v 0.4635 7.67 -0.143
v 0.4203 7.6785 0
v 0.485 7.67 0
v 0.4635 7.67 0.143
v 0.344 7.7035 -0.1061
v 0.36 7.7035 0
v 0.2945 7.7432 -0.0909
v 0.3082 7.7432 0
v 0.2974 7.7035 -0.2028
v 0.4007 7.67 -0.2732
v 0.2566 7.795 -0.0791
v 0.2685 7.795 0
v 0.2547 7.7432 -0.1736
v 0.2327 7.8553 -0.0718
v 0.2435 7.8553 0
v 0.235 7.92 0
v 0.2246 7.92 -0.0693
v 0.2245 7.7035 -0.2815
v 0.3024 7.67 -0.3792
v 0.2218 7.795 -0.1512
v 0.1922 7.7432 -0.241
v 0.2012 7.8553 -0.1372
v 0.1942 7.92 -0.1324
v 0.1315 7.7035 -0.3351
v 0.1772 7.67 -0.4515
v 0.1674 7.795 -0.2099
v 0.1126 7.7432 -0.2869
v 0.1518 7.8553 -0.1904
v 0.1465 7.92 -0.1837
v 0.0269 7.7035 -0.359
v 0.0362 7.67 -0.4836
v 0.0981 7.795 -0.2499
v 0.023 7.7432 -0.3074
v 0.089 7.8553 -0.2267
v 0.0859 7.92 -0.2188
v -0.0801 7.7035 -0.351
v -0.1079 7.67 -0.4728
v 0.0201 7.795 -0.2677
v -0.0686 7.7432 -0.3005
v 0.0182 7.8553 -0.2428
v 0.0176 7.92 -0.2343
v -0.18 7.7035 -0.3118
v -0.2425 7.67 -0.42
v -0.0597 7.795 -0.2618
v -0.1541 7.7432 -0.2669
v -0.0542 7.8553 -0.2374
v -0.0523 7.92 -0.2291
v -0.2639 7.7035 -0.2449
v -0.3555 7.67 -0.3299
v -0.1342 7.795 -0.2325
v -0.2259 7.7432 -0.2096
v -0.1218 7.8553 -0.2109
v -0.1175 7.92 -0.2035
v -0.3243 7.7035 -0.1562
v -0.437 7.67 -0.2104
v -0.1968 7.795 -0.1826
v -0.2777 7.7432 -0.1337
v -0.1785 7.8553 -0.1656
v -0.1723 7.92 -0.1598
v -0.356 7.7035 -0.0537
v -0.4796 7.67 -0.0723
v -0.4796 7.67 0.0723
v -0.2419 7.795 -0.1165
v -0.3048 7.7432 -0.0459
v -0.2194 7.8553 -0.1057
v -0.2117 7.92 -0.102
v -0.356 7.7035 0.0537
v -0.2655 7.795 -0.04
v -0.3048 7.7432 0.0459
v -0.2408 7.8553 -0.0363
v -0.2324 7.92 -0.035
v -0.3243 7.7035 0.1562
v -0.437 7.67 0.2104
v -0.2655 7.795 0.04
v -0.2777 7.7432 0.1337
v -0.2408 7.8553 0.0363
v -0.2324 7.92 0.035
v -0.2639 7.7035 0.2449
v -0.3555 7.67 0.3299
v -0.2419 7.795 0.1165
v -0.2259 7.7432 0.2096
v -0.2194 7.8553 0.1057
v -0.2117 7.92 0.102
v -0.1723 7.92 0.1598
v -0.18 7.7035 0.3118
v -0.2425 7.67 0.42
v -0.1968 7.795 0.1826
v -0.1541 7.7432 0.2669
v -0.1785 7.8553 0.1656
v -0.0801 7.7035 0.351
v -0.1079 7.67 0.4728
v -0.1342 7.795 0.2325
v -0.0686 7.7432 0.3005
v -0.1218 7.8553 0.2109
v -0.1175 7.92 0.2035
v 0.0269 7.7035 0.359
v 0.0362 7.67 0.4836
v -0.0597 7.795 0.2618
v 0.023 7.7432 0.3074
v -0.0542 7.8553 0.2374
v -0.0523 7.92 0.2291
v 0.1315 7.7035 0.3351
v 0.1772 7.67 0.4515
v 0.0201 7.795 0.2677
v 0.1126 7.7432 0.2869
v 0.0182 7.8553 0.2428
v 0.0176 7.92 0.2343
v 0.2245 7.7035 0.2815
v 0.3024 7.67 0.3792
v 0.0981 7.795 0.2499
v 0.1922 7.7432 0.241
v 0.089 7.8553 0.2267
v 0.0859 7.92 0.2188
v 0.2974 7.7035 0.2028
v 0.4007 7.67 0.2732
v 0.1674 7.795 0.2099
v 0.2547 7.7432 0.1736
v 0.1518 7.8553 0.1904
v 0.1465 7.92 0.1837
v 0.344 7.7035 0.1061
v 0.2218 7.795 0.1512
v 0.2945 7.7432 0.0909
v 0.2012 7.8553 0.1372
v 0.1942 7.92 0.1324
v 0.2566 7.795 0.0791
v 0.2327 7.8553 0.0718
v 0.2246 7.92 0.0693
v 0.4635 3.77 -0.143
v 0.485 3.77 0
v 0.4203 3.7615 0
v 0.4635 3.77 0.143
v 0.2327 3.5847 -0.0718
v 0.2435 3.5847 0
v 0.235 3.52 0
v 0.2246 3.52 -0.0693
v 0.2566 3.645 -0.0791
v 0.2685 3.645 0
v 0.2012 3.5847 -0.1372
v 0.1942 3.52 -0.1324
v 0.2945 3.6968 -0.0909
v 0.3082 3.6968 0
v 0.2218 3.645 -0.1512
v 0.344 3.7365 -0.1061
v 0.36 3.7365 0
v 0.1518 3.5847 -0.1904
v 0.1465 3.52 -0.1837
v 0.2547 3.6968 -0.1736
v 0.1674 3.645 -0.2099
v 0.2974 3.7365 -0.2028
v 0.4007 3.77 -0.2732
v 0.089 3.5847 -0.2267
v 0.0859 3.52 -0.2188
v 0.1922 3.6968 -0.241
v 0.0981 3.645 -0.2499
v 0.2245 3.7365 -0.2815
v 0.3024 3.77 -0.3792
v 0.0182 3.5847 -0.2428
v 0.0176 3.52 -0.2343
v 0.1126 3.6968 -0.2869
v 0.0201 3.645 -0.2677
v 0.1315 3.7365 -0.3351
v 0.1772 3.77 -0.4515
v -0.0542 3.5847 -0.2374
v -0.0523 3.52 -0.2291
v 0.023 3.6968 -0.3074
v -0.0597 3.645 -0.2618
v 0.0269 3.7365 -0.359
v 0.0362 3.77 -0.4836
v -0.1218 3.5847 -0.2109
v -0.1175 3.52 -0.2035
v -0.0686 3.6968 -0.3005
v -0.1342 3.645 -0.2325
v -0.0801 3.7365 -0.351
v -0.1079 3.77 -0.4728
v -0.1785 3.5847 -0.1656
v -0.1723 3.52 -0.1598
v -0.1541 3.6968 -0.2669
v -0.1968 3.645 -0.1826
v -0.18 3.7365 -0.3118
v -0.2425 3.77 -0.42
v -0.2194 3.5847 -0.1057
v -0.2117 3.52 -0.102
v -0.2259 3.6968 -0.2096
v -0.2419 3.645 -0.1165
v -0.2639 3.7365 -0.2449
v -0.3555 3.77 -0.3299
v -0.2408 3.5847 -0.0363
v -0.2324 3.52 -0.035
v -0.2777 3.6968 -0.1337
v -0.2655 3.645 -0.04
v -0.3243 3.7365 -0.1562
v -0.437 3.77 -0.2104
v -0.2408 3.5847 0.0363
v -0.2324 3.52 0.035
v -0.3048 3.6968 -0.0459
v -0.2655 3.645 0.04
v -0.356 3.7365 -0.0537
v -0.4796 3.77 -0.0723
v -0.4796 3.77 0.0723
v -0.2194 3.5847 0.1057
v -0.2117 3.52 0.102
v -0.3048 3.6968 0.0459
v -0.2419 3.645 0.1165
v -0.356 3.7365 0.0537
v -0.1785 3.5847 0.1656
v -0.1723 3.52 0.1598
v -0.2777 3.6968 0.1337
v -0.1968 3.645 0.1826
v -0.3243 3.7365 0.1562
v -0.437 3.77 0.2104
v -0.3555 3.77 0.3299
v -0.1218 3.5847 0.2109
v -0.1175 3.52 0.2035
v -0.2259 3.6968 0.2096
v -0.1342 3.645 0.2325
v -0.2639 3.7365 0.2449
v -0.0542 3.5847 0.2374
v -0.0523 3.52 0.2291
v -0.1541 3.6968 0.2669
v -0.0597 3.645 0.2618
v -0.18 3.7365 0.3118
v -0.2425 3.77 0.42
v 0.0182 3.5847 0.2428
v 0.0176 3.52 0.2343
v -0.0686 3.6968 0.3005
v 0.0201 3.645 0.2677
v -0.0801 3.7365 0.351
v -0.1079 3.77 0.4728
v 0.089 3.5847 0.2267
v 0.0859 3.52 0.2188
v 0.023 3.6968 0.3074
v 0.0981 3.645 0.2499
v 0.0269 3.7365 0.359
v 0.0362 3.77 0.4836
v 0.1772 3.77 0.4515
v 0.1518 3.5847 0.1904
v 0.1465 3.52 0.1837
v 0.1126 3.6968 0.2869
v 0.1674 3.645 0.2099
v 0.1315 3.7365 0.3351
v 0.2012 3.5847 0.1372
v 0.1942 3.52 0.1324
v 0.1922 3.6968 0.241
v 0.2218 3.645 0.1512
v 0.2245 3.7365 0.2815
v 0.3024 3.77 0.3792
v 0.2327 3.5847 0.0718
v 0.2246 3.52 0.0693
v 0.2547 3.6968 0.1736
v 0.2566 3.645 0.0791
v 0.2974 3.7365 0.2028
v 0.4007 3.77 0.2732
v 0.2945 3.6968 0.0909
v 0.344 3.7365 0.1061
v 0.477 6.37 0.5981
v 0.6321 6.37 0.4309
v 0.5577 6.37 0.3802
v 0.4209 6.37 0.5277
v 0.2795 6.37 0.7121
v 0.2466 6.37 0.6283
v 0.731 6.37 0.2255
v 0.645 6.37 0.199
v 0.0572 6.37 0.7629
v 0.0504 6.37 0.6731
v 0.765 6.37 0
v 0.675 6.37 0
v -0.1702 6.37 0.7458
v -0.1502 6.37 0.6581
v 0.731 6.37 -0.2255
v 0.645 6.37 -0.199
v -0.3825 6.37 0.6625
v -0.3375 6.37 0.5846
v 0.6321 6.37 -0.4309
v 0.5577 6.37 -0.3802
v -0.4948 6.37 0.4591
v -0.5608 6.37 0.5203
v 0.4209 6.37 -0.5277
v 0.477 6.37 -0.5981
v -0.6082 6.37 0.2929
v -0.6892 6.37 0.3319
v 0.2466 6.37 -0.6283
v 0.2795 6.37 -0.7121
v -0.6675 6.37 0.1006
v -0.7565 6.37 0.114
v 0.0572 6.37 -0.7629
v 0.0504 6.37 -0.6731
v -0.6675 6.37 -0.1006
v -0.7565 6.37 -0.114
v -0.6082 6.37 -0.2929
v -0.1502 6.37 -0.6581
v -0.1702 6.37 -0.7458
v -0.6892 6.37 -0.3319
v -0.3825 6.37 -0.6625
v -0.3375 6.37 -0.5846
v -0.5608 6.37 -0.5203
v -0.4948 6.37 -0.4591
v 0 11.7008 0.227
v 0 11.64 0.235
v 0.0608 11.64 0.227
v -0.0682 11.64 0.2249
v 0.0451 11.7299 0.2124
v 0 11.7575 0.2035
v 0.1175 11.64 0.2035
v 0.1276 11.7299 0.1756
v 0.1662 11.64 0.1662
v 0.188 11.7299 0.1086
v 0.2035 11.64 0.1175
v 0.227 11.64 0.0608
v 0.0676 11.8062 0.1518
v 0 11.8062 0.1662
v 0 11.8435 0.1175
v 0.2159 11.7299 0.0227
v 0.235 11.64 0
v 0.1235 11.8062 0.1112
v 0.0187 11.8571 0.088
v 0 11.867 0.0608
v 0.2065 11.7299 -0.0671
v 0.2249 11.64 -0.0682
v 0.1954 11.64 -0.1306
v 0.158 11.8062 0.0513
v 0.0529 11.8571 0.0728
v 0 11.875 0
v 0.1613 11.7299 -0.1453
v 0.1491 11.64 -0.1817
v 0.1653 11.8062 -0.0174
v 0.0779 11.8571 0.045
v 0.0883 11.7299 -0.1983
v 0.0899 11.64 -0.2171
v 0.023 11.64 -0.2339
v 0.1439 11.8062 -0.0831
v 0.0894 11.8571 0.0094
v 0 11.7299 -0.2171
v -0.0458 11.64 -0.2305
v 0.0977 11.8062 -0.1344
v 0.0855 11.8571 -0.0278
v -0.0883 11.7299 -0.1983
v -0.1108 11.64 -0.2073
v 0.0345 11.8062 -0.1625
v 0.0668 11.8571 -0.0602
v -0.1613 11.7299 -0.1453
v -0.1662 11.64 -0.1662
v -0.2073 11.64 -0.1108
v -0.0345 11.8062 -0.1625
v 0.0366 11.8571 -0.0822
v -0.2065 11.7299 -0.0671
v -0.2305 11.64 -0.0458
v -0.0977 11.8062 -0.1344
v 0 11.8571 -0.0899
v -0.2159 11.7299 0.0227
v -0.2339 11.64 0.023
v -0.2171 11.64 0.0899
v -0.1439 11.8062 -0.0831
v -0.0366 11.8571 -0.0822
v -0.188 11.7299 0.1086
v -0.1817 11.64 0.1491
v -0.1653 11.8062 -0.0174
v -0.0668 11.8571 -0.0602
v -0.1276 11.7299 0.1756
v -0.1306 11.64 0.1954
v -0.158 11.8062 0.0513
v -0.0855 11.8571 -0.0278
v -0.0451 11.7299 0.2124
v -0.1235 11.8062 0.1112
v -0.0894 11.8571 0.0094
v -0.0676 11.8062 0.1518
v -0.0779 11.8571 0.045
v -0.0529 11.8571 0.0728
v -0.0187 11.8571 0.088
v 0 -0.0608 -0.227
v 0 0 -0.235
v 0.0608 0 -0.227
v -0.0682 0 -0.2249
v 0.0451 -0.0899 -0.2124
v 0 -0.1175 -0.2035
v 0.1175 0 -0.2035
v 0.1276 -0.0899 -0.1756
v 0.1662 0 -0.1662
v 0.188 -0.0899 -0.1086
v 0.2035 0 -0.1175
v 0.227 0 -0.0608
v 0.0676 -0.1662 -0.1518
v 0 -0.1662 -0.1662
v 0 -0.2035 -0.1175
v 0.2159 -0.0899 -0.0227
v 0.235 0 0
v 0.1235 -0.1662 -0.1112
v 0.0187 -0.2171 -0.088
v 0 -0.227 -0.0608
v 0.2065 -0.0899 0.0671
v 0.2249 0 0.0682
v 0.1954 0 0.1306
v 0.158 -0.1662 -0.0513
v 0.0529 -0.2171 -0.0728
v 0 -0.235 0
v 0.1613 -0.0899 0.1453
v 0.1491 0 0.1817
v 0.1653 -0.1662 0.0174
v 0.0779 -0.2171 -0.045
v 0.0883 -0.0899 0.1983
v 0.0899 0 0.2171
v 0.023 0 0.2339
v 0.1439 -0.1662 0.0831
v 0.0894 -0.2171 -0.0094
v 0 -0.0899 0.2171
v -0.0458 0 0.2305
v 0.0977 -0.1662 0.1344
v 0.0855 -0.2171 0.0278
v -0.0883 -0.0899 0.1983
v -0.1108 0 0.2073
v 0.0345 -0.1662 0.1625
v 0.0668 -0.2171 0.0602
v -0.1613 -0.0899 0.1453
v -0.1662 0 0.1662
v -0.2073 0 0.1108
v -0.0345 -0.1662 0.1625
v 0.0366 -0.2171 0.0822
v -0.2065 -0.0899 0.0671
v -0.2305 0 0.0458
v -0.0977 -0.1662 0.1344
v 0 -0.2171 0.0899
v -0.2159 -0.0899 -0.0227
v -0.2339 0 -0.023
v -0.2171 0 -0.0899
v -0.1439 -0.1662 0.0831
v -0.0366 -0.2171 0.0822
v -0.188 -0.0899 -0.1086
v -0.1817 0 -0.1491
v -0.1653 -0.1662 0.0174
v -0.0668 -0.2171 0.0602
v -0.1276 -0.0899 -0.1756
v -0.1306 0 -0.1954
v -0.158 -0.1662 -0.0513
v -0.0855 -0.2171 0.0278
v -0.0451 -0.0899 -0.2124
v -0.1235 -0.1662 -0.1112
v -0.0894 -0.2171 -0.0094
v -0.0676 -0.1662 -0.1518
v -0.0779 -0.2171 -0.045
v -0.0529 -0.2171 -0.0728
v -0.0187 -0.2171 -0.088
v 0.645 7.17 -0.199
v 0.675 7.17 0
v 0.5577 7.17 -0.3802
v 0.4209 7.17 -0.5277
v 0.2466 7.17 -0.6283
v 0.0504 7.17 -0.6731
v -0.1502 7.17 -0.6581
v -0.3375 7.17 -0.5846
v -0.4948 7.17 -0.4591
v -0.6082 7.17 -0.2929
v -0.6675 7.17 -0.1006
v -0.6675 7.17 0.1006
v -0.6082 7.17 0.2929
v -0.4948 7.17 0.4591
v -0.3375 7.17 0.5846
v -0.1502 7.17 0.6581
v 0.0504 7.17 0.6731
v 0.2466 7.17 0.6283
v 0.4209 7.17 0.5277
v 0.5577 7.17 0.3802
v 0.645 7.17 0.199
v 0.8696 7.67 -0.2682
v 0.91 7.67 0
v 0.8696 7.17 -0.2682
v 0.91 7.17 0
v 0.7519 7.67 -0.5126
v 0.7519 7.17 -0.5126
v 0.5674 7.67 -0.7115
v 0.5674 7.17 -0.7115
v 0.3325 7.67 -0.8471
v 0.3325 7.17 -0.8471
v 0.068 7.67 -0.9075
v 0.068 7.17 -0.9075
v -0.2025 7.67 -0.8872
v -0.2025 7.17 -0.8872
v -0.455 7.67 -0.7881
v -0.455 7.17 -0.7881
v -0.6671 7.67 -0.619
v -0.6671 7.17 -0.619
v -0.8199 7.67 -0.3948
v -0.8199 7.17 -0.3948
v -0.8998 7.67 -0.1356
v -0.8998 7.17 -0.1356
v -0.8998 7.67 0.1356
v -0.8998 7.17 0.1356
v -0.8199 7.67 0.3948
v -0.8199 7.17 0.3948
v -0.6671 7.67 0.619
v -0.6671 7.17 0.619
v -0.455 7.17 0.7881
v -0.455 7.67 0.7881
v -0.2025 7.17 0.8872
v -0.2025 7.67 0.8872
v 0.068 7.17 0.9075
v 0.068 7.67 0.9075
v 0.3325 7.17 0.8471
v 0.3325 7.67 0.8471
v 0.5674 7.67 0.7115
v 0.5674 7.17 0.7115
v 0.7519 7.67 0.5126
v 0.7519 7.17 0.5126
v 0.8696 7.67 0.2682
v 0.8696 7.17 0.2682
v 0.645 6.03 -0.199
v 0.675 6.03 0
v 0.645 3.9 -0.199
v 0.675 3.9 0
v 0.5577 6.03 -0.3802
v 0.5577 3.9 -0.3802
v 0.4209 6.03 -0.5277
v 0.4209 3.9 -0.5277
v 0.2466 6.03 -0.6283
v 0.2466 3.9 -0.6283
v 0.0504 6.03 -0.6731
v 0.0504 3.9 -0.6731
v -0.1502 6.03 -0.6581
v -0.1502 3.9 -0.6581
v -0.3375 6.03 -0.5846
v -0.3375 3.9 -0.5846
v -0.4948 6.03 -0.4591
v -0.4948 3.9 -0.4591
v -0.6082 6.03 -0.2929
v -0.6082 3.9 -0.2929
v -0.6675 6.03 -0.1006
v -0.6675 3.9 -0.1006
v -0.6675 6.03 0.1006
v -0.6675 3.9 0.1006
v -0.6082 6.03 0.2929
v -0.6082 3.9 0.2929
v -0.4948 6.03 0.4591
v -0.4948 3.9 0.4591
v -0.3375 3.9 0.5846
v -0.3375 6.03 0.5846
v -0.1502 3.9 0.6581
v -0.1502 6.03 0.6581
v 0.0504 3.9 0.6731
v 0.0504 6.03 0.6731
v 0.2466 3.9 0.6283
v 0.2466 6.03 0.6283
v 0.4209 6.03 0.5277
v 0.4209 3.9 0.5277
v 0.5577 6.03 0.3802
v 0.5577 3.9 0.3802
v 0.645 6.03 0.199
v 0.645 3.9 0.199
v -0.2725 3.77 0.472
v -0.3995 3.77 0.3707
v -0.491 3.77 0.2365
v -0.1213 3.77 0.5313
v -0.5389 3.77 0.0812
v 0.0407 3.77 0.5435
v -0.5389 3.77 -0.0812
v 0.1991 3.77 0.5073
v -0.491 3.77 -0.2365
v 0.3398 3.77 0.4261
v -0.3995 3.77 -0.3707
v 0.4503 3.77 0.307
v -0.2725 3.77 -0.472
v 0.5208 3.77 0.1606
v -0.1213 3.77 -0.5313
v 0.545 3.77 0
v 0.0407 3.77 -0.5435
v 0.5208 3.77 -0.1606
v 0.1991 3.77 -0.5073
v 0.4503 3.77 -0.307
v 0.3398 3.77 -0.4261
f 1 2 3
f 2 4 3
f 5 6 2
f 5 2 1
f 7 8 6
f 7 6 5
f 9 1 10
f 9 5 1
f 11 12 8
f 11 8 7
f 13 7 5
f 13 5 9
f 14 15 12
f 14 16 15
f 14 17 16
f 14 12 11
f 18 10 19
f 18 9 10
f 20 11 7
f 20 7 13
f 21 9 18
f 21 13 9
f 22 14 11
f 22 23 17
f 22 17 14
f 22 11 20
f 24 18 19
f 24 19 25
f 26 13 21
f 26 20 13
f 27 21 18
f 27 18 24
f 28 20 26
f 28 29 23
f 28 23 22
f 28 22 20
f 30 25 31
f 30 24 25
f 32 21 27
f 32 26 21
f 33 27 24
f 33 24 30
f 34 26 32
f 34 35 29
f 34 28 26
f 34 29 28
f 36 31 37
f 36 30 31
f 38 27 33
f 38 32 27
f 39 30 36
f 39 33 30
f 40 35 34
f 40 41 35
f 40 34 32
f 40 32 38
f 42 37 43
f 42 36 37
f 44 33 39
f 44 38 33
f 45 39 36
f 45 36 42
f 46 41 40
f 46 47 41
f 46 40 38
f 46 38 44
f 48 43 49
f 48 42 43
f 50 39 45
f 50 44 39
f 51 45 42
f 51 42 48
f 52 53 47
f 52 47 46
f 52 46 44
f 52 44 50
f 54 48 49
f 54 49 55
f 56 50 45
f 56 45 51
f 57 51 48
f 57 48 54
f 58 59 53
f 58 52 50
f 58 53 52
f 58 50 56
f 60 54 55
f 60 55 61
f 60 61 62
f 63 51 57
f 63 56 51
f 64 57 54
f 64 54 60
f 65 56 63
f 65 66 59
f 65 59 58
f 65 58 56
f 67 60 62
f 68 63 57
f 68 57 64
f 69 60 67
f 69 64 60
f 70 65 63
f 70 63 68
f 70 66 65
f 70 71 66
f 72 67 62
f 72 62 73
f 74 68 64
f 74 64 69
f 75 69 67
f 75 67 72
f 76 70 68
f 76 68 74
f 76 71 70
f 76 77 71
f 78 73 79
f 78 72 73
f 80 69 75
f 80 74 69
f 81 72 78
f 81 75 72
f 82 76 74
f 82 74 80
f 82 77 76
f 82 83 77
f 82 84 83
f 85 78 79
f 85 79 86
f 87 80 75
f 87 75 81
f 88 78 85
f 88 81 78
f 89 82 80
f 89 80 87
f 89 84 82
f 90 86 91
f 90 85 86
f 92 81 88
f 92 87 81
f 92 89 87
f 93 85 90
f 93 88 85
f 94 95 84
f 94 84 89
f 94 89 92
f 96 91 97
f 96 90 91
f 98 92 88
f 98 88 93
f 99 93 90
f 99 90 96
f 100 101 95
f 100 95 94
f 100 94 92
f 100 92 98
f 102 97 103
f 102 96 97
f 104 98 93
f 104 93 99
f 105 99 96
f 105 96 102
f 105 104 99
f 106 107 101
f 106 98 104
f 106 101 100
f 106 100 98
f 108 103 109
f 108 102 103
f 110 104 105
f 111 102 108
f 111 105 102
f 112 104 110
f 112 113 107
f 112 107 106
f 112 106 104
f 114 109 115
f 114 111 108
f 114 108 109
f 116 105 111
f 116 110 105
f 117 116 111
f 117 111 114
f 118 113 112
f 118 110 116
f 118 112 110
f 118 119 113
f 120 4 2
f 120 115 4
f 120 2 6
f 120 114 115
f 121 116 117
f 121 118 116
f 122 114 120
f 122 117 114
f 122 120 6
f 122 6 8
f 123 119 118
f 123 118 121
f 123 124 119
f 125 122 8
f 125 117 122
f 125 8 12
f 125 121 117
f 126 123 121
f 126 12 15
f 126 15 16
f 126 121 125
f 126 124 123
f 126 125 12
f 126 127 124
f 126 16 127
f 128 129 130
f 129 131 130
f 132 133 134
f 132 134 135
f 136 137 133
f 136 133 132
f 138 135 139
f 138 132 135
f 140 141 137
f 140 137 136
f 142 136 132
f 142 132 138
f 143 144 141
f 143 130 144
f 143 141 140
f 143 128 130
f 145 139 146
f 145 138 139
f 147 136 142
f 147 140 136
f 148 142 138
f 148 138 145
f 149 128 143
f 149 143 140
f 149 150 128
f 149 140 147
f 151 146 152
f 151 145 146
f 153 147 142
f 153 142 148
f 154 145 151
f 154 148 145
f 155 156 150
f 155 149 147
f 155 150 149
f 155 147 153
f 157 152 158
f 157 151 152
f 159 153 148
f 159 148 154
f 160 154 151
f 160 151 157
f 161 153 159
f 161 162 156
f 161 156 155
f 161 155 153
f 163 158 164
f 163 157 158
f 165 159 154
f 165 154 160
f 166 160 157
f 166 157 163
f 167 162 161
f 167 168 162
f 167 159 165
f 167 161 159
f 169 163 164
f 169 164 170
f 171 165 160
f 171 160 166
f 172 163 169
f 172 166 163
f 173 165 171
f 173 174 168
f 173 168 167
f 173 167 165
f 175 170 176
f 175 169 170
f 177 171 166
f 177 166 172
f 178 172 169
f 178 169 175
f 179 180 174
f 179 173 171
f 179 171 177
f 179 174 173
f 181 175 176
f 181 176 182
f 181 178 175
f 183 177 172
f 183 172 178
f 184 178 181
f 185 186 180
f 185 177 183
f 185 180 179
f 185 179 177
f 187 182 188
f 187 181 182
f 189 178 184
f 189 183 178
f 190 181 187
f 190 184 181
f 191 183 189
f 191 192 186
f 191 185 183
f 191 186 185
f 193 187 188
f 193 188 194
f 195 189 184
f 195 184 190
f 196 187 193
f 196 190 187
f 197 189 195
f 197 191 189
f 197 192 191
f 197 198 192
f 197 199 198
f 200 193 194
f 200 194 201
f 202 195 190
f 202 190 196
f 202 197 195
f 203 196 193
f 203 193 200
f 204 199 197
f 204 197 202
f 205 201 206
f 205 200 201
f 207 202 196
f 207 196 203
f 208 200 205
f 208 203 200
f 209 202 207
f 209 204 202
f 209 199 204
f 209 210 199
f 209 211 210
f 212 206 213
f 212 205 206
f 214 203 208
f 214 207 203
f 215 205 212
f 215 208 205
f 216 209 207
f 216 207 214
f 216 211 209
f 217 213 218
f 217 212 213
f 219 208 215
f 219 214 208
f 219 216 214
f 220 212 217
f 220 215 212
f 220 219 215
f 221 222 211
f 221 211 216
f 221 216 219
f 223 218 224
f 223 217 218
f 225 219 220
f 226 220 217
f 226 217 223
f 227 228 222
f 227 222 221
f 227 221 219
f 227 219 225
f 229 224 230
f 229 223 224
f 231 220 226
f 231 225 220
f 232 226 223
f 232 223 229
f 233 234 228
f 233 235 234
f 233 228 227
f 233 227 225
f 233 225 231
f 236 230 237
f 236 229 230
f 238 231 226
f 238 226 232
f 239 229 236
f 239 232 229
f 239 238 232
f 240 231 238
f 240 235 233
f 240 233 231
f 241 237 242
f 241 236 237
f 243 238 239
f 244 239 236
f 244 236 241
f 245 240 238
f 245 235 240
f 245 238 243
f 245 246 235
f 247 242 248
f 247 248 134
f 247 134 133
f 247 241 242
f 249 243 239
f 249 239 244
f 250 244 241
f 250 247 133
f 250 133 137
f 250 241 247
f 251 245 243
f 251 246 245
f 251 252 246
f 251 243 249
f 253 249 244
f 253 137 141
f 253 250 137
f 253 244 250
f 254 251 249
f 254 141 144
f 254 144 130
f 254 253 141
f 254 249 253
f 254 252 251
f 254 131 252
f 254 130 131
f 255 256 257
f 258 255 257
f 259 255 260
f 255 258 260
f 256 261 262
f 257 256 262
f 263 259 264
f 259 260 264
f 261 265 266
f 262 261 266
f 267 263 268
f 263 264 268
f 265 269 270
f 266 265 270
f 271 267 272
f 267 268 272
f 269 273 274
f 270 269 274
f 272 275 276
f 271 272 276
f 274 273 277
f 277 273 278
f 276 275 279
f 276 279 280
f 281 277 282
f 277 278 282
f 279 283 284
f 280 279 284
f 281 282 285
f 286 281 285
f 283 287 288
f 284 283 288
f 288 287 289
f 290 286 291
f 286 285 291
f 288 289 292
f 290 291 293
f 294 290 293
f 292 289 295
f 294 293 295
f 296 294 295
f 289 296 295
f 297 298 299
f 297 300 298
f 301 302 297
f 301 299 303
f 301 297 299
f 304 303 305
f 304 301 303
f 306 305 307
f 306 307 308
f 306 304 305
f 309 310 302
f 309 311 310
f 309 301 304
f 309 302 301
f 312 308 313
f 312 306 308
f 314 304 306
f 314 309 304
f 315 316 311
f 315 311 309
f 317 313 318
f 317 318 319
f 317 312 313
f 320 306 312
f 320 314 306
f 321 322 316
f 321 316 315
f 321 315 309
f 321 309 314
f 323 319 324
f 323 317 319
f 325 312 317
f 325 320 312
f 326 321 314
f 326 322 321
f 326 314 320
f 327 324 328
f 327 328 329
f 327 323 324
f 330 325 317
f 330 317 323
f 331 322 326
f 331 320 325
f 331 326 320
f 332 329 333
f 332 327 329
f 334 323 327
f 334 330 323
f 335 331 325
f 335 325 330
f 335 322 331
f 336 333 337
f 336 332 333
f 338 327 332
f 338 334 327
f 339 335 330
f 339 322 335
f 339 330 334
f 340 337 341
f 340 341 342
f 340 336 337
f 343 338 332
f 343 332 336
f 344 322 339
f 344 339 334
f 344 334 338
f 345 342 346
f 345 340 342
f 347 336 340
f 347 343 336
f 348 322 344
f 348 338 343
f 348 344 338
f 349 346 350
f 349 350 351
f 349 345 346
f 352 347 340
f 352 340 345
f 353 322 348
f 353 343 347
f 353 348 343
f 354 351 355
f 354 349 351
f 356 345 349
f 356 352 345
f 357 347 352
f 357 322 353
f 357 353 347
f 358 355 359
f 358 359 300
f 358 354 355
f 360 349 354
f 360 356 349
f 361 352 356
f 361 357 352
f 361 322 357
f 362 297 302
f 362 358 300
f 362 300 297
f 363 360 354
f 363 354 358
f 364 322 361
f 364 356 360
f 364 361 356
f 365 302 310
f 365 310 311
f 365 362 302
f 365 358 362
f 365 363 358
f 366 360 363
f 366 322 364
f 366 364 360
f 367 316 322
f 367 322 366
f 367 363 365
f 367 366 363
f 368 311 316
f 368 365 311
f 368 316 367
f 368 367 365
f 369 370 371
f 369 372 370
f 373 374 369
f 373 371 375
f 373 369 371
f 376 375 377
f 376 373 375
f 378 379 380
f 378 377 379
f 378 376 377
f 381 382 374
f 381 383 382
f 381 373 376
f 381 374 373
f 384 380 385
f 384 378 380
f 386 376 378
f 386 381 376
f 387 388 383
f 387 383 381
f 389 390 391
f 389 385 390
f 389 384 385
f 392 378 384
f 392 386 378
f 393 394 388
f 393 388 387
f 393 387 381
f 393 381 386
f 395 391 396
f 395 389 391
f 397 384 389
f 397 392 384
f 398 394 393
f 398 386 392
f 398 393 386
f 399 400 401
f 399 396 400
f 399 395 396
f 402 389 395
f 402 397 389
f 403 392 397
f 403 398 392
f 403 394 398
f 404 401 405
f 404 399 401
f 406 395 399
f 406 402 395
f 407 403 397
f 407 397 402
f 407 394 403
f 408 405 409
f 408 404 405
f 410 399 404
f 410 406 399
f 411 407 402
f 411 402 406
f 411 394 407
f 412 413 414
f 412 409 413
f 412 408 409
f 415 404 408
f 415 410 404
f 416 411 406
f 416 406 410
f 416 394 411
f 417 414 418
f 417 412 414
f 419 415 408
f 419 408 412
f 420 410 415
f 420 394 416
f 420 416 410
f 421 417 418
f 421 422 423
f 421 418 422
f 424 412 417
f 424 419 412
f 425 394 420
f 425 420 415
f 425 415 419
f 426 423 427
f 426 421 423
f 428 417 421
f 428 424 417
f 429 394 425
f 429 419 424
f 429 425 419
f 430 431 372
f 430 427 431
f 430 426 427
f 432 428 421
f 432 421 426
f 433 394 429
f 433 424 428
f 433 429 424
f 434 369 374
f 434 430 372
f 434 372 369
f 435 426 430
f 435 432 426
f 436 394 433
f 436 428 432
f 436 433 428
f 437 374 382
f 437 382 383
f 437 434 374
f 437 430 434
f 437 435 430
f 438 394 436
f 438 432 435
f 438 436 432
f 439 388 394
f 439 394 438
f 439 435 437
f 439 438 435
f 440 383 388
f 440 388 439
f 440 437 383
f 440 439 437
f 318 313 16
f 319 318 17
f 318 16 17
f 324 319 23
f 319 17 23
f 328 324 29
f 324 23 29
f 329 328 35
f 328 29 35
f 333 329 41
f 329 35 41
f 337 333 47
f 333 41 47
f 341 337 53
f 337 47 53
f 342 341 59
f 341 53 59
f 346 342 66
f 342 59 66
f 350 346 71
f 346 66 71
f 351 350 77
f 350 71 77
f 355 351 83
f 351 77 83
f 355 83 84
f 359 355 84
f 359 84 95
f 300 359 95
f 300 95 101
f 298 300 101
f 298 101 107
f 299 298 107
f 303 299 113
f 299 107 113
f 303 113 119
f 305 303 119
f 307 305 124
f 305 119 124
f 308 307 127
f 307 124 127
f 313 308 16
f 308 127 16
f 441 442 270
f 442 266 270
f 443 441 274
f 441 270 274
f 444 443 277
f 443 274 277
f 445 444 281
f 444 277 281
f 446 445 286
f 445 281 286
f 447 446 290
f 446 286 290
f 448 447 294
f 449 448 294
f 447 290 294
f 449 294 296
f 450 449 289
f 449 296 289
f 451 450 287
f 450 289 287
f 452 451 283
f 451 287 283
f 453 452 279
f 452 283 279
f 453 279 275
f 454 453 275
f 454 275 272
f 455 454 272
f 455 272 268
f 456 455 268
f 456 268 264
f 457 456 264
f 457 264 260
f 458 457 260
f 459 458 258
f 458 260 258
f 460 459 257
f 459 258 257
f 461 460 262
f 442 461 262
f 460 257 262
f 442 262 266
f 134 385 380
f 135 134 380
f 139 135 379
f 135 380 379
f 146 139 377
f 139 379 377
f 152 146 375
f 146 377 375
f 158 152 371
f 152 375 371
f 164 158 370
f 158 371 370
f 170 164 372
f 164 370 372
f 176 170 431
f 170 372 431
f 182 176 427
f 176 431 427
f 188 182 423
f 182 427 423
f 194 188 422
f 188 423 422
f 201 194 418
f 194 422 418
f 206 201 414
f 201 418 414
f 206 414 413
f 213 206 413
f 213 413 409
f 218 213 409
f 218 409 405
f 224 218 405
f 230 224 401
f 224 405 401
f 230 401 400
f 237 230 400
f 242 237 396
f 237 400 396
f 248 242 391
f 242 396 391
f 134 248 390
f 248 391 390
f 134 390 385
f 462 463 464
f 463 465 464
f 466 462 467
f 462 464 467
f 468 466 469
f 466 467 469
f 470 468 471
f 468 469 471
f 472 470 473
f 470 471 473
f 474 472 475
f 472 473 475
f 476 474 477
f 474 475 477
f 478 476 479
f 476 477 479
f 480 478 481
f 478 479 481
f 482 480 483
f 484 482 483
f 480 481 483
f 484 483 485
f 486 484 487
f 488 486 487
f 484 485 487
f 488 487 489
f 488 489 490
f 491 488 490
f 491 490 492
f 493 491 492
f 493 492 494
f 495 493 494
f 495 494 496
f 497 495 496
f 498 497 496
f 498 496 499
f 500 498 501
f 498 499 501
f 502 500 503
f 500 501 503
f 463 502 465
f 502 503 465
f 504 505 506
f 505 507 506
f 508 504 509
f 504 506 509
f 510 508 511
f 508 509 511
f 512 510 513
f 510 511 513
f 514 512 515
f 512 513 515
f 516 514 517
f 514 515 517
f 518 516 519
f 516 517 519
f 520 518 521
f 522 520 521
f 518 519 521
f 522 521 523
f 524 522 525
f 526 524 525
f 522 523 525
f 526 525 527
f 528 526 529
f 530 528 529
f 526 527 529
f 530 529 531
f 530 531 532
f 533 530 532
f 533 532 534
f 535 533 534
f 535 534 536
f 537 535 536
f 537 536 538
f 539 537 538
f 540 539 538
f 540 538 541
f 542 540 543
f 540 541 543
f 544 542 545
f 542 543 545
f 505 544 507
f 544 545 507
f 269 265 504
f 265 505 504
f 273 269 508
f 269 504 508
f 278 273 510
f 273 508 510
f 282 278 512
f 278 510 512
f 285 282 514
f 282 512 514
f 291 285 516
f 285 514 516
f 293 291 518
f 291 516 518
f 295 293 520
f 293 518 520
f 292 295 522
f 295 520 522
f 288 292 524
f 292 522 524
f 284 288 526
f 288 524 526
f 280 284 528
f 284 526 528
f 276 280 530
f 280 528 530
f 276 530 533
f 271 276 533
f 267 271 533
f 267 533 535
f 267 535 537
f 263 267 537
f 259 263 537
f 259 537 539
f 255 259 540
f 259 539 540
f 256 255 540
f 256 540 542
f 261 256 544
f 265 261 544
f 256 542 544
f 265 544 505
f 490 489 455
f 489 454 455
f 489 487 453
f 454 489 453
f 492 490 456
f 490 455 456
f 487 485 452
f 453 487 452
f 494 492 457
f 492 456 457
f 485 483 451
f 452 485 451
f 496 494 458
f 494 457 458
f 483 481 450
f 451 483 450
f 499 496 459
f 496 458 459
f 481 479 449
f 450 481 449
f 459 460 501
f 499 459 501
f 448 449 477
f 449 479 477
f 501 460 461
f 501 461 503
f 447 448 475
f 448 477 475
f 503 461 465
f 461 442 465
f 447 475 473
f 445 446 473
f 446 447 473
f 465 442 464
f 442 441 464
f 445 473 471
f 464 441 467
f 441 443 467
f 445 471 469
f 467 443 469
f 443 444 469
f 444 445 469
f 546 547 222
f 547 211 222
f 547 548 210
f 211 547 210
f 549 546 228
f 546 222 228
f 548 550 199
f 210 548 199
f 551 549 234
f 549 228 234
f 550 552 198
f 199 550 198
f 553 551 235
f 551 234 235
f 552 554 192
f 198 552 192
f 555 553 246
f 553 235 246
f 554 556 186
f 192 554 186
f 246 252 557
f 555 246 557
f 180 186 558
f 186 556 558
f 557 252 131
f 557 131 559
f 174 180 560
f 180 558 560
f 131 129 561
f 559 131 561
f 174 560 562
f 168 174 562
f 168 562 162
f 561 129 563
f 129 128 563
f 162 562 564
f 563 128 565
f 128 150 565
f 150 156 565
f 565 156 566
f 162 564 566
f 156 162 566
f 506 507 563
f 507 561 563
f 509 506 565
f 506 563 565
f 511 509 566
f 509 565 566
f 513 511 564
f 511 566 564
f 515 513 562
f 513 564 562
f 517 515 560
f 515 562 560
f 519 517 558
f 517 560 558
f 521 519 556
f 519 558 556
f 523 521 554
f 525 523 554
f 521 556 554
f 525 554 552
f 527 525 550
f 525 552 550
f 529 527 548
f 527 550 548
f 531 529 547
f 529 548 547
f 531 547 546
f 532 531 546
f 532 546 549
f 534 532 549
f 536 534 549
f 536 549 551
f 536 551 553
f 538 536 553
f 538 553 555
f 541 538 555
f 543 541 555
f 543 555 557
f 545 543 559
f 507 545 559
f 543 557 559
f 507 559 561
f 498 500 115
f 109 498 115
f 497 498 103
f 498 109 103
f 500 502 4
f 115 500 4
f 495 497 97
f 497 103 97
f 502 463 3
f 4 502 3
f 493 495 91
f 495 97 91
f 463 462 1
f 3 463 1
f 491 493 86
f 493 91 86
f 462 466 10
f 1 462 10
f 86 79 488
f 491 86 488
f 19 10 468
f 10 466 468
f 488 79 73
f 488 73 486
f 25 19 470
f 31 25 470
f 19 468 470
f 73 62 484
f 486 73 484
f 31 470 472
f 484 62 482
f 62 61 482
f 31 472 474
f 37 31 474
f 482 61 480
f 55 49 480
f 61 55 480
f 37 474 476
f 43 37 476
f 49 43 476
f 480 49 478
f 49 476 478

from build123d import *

# Parameters (mm, degrees)
DOME1_FACE_RADIUS = 0.235
DOME1_HEIGHT      = 0.235
DOME2_FACE_RADIUS = 0.235
DOME2_HEIGHT      = 0.235
FILLET1_R         = 0.25


with BuildPart() as part:
    # Sketch1 → Revolve1 (revolve)
    with BuildSketch(Plane.XY):
        Polygon((0, 0), (0, 11.64), (0.235, 11.64), (0.235, 7.67), (0.91, 7.67), (0.91, 7.17), (0.675, 7.17), (0.675, 6.37), (0.765, 6.37), (0.675, 6.03), (0.675, 3.9), (0.545, 3.77), (0.235, 3.77), (0.235, 0), align=None)
    revolve(axis=Axis((0, 0, 0), (0, 1, 0)))

    # Dome1: a dome of height H over a round flat face of radius A is a cap of a sphere of radius (A * A + H * H) / (2 * H)
    dome1_r = (DOME1_FACE_RADIUS * DOME1_FACE_RADIUS + DOME1_HEIGHT * DOME1_HEIGHT) / (2 * DOME1_HEIGHT)
    dome1_base = Plane((0, 11.64, 0), z_dir=(0, 1, 0))
    with Locations(dome1_base.offset(DOME1_HEIGHT - dome1_r)):
        dome1_ball = Sphere(dome1_r, mode=Mode.PRIVATE)
    add(split(dome1_ball, bisect_by=dome1_base, keep=Keep.TOP, mode=Mode.PRIVATE))

    # Dome2: a dome of height H over a round flat face of radius A is a cap of a sphere of radius (A * A + H * H) / (2 * H)
    dome2_r = (DOME2_FACE_RADIUS * DOME2_FACE_RADIUS + DOME2_HEIGHT * DOME2_HEIGHT) / (2 * DOME2_HEIGHT)
    dome2_base = Plane((0, 0, 0), z_dir=(0, -1, 0))
    with Locations(dome2_base.offset(DOME2_HEIGHT - dome2_r)):
        dome2_ball = Sphere(dome2_r, mode=Mode.PRIVATE)
    add(split(dome2_ball, bisect_by=dome2_base, keep=Keep.TOP, mode=Mode.PRIVATE))

    # Fillet1
    fillet1_edges = [part.edges().sort_by_distance(p)[0] for p in [
        (-0.235, 7.67, 0),
        (-0.235, 3.77, 0),
    ]]
    fillet(fillet1_edges, radius=FILLET1_R)


solid = part.part
